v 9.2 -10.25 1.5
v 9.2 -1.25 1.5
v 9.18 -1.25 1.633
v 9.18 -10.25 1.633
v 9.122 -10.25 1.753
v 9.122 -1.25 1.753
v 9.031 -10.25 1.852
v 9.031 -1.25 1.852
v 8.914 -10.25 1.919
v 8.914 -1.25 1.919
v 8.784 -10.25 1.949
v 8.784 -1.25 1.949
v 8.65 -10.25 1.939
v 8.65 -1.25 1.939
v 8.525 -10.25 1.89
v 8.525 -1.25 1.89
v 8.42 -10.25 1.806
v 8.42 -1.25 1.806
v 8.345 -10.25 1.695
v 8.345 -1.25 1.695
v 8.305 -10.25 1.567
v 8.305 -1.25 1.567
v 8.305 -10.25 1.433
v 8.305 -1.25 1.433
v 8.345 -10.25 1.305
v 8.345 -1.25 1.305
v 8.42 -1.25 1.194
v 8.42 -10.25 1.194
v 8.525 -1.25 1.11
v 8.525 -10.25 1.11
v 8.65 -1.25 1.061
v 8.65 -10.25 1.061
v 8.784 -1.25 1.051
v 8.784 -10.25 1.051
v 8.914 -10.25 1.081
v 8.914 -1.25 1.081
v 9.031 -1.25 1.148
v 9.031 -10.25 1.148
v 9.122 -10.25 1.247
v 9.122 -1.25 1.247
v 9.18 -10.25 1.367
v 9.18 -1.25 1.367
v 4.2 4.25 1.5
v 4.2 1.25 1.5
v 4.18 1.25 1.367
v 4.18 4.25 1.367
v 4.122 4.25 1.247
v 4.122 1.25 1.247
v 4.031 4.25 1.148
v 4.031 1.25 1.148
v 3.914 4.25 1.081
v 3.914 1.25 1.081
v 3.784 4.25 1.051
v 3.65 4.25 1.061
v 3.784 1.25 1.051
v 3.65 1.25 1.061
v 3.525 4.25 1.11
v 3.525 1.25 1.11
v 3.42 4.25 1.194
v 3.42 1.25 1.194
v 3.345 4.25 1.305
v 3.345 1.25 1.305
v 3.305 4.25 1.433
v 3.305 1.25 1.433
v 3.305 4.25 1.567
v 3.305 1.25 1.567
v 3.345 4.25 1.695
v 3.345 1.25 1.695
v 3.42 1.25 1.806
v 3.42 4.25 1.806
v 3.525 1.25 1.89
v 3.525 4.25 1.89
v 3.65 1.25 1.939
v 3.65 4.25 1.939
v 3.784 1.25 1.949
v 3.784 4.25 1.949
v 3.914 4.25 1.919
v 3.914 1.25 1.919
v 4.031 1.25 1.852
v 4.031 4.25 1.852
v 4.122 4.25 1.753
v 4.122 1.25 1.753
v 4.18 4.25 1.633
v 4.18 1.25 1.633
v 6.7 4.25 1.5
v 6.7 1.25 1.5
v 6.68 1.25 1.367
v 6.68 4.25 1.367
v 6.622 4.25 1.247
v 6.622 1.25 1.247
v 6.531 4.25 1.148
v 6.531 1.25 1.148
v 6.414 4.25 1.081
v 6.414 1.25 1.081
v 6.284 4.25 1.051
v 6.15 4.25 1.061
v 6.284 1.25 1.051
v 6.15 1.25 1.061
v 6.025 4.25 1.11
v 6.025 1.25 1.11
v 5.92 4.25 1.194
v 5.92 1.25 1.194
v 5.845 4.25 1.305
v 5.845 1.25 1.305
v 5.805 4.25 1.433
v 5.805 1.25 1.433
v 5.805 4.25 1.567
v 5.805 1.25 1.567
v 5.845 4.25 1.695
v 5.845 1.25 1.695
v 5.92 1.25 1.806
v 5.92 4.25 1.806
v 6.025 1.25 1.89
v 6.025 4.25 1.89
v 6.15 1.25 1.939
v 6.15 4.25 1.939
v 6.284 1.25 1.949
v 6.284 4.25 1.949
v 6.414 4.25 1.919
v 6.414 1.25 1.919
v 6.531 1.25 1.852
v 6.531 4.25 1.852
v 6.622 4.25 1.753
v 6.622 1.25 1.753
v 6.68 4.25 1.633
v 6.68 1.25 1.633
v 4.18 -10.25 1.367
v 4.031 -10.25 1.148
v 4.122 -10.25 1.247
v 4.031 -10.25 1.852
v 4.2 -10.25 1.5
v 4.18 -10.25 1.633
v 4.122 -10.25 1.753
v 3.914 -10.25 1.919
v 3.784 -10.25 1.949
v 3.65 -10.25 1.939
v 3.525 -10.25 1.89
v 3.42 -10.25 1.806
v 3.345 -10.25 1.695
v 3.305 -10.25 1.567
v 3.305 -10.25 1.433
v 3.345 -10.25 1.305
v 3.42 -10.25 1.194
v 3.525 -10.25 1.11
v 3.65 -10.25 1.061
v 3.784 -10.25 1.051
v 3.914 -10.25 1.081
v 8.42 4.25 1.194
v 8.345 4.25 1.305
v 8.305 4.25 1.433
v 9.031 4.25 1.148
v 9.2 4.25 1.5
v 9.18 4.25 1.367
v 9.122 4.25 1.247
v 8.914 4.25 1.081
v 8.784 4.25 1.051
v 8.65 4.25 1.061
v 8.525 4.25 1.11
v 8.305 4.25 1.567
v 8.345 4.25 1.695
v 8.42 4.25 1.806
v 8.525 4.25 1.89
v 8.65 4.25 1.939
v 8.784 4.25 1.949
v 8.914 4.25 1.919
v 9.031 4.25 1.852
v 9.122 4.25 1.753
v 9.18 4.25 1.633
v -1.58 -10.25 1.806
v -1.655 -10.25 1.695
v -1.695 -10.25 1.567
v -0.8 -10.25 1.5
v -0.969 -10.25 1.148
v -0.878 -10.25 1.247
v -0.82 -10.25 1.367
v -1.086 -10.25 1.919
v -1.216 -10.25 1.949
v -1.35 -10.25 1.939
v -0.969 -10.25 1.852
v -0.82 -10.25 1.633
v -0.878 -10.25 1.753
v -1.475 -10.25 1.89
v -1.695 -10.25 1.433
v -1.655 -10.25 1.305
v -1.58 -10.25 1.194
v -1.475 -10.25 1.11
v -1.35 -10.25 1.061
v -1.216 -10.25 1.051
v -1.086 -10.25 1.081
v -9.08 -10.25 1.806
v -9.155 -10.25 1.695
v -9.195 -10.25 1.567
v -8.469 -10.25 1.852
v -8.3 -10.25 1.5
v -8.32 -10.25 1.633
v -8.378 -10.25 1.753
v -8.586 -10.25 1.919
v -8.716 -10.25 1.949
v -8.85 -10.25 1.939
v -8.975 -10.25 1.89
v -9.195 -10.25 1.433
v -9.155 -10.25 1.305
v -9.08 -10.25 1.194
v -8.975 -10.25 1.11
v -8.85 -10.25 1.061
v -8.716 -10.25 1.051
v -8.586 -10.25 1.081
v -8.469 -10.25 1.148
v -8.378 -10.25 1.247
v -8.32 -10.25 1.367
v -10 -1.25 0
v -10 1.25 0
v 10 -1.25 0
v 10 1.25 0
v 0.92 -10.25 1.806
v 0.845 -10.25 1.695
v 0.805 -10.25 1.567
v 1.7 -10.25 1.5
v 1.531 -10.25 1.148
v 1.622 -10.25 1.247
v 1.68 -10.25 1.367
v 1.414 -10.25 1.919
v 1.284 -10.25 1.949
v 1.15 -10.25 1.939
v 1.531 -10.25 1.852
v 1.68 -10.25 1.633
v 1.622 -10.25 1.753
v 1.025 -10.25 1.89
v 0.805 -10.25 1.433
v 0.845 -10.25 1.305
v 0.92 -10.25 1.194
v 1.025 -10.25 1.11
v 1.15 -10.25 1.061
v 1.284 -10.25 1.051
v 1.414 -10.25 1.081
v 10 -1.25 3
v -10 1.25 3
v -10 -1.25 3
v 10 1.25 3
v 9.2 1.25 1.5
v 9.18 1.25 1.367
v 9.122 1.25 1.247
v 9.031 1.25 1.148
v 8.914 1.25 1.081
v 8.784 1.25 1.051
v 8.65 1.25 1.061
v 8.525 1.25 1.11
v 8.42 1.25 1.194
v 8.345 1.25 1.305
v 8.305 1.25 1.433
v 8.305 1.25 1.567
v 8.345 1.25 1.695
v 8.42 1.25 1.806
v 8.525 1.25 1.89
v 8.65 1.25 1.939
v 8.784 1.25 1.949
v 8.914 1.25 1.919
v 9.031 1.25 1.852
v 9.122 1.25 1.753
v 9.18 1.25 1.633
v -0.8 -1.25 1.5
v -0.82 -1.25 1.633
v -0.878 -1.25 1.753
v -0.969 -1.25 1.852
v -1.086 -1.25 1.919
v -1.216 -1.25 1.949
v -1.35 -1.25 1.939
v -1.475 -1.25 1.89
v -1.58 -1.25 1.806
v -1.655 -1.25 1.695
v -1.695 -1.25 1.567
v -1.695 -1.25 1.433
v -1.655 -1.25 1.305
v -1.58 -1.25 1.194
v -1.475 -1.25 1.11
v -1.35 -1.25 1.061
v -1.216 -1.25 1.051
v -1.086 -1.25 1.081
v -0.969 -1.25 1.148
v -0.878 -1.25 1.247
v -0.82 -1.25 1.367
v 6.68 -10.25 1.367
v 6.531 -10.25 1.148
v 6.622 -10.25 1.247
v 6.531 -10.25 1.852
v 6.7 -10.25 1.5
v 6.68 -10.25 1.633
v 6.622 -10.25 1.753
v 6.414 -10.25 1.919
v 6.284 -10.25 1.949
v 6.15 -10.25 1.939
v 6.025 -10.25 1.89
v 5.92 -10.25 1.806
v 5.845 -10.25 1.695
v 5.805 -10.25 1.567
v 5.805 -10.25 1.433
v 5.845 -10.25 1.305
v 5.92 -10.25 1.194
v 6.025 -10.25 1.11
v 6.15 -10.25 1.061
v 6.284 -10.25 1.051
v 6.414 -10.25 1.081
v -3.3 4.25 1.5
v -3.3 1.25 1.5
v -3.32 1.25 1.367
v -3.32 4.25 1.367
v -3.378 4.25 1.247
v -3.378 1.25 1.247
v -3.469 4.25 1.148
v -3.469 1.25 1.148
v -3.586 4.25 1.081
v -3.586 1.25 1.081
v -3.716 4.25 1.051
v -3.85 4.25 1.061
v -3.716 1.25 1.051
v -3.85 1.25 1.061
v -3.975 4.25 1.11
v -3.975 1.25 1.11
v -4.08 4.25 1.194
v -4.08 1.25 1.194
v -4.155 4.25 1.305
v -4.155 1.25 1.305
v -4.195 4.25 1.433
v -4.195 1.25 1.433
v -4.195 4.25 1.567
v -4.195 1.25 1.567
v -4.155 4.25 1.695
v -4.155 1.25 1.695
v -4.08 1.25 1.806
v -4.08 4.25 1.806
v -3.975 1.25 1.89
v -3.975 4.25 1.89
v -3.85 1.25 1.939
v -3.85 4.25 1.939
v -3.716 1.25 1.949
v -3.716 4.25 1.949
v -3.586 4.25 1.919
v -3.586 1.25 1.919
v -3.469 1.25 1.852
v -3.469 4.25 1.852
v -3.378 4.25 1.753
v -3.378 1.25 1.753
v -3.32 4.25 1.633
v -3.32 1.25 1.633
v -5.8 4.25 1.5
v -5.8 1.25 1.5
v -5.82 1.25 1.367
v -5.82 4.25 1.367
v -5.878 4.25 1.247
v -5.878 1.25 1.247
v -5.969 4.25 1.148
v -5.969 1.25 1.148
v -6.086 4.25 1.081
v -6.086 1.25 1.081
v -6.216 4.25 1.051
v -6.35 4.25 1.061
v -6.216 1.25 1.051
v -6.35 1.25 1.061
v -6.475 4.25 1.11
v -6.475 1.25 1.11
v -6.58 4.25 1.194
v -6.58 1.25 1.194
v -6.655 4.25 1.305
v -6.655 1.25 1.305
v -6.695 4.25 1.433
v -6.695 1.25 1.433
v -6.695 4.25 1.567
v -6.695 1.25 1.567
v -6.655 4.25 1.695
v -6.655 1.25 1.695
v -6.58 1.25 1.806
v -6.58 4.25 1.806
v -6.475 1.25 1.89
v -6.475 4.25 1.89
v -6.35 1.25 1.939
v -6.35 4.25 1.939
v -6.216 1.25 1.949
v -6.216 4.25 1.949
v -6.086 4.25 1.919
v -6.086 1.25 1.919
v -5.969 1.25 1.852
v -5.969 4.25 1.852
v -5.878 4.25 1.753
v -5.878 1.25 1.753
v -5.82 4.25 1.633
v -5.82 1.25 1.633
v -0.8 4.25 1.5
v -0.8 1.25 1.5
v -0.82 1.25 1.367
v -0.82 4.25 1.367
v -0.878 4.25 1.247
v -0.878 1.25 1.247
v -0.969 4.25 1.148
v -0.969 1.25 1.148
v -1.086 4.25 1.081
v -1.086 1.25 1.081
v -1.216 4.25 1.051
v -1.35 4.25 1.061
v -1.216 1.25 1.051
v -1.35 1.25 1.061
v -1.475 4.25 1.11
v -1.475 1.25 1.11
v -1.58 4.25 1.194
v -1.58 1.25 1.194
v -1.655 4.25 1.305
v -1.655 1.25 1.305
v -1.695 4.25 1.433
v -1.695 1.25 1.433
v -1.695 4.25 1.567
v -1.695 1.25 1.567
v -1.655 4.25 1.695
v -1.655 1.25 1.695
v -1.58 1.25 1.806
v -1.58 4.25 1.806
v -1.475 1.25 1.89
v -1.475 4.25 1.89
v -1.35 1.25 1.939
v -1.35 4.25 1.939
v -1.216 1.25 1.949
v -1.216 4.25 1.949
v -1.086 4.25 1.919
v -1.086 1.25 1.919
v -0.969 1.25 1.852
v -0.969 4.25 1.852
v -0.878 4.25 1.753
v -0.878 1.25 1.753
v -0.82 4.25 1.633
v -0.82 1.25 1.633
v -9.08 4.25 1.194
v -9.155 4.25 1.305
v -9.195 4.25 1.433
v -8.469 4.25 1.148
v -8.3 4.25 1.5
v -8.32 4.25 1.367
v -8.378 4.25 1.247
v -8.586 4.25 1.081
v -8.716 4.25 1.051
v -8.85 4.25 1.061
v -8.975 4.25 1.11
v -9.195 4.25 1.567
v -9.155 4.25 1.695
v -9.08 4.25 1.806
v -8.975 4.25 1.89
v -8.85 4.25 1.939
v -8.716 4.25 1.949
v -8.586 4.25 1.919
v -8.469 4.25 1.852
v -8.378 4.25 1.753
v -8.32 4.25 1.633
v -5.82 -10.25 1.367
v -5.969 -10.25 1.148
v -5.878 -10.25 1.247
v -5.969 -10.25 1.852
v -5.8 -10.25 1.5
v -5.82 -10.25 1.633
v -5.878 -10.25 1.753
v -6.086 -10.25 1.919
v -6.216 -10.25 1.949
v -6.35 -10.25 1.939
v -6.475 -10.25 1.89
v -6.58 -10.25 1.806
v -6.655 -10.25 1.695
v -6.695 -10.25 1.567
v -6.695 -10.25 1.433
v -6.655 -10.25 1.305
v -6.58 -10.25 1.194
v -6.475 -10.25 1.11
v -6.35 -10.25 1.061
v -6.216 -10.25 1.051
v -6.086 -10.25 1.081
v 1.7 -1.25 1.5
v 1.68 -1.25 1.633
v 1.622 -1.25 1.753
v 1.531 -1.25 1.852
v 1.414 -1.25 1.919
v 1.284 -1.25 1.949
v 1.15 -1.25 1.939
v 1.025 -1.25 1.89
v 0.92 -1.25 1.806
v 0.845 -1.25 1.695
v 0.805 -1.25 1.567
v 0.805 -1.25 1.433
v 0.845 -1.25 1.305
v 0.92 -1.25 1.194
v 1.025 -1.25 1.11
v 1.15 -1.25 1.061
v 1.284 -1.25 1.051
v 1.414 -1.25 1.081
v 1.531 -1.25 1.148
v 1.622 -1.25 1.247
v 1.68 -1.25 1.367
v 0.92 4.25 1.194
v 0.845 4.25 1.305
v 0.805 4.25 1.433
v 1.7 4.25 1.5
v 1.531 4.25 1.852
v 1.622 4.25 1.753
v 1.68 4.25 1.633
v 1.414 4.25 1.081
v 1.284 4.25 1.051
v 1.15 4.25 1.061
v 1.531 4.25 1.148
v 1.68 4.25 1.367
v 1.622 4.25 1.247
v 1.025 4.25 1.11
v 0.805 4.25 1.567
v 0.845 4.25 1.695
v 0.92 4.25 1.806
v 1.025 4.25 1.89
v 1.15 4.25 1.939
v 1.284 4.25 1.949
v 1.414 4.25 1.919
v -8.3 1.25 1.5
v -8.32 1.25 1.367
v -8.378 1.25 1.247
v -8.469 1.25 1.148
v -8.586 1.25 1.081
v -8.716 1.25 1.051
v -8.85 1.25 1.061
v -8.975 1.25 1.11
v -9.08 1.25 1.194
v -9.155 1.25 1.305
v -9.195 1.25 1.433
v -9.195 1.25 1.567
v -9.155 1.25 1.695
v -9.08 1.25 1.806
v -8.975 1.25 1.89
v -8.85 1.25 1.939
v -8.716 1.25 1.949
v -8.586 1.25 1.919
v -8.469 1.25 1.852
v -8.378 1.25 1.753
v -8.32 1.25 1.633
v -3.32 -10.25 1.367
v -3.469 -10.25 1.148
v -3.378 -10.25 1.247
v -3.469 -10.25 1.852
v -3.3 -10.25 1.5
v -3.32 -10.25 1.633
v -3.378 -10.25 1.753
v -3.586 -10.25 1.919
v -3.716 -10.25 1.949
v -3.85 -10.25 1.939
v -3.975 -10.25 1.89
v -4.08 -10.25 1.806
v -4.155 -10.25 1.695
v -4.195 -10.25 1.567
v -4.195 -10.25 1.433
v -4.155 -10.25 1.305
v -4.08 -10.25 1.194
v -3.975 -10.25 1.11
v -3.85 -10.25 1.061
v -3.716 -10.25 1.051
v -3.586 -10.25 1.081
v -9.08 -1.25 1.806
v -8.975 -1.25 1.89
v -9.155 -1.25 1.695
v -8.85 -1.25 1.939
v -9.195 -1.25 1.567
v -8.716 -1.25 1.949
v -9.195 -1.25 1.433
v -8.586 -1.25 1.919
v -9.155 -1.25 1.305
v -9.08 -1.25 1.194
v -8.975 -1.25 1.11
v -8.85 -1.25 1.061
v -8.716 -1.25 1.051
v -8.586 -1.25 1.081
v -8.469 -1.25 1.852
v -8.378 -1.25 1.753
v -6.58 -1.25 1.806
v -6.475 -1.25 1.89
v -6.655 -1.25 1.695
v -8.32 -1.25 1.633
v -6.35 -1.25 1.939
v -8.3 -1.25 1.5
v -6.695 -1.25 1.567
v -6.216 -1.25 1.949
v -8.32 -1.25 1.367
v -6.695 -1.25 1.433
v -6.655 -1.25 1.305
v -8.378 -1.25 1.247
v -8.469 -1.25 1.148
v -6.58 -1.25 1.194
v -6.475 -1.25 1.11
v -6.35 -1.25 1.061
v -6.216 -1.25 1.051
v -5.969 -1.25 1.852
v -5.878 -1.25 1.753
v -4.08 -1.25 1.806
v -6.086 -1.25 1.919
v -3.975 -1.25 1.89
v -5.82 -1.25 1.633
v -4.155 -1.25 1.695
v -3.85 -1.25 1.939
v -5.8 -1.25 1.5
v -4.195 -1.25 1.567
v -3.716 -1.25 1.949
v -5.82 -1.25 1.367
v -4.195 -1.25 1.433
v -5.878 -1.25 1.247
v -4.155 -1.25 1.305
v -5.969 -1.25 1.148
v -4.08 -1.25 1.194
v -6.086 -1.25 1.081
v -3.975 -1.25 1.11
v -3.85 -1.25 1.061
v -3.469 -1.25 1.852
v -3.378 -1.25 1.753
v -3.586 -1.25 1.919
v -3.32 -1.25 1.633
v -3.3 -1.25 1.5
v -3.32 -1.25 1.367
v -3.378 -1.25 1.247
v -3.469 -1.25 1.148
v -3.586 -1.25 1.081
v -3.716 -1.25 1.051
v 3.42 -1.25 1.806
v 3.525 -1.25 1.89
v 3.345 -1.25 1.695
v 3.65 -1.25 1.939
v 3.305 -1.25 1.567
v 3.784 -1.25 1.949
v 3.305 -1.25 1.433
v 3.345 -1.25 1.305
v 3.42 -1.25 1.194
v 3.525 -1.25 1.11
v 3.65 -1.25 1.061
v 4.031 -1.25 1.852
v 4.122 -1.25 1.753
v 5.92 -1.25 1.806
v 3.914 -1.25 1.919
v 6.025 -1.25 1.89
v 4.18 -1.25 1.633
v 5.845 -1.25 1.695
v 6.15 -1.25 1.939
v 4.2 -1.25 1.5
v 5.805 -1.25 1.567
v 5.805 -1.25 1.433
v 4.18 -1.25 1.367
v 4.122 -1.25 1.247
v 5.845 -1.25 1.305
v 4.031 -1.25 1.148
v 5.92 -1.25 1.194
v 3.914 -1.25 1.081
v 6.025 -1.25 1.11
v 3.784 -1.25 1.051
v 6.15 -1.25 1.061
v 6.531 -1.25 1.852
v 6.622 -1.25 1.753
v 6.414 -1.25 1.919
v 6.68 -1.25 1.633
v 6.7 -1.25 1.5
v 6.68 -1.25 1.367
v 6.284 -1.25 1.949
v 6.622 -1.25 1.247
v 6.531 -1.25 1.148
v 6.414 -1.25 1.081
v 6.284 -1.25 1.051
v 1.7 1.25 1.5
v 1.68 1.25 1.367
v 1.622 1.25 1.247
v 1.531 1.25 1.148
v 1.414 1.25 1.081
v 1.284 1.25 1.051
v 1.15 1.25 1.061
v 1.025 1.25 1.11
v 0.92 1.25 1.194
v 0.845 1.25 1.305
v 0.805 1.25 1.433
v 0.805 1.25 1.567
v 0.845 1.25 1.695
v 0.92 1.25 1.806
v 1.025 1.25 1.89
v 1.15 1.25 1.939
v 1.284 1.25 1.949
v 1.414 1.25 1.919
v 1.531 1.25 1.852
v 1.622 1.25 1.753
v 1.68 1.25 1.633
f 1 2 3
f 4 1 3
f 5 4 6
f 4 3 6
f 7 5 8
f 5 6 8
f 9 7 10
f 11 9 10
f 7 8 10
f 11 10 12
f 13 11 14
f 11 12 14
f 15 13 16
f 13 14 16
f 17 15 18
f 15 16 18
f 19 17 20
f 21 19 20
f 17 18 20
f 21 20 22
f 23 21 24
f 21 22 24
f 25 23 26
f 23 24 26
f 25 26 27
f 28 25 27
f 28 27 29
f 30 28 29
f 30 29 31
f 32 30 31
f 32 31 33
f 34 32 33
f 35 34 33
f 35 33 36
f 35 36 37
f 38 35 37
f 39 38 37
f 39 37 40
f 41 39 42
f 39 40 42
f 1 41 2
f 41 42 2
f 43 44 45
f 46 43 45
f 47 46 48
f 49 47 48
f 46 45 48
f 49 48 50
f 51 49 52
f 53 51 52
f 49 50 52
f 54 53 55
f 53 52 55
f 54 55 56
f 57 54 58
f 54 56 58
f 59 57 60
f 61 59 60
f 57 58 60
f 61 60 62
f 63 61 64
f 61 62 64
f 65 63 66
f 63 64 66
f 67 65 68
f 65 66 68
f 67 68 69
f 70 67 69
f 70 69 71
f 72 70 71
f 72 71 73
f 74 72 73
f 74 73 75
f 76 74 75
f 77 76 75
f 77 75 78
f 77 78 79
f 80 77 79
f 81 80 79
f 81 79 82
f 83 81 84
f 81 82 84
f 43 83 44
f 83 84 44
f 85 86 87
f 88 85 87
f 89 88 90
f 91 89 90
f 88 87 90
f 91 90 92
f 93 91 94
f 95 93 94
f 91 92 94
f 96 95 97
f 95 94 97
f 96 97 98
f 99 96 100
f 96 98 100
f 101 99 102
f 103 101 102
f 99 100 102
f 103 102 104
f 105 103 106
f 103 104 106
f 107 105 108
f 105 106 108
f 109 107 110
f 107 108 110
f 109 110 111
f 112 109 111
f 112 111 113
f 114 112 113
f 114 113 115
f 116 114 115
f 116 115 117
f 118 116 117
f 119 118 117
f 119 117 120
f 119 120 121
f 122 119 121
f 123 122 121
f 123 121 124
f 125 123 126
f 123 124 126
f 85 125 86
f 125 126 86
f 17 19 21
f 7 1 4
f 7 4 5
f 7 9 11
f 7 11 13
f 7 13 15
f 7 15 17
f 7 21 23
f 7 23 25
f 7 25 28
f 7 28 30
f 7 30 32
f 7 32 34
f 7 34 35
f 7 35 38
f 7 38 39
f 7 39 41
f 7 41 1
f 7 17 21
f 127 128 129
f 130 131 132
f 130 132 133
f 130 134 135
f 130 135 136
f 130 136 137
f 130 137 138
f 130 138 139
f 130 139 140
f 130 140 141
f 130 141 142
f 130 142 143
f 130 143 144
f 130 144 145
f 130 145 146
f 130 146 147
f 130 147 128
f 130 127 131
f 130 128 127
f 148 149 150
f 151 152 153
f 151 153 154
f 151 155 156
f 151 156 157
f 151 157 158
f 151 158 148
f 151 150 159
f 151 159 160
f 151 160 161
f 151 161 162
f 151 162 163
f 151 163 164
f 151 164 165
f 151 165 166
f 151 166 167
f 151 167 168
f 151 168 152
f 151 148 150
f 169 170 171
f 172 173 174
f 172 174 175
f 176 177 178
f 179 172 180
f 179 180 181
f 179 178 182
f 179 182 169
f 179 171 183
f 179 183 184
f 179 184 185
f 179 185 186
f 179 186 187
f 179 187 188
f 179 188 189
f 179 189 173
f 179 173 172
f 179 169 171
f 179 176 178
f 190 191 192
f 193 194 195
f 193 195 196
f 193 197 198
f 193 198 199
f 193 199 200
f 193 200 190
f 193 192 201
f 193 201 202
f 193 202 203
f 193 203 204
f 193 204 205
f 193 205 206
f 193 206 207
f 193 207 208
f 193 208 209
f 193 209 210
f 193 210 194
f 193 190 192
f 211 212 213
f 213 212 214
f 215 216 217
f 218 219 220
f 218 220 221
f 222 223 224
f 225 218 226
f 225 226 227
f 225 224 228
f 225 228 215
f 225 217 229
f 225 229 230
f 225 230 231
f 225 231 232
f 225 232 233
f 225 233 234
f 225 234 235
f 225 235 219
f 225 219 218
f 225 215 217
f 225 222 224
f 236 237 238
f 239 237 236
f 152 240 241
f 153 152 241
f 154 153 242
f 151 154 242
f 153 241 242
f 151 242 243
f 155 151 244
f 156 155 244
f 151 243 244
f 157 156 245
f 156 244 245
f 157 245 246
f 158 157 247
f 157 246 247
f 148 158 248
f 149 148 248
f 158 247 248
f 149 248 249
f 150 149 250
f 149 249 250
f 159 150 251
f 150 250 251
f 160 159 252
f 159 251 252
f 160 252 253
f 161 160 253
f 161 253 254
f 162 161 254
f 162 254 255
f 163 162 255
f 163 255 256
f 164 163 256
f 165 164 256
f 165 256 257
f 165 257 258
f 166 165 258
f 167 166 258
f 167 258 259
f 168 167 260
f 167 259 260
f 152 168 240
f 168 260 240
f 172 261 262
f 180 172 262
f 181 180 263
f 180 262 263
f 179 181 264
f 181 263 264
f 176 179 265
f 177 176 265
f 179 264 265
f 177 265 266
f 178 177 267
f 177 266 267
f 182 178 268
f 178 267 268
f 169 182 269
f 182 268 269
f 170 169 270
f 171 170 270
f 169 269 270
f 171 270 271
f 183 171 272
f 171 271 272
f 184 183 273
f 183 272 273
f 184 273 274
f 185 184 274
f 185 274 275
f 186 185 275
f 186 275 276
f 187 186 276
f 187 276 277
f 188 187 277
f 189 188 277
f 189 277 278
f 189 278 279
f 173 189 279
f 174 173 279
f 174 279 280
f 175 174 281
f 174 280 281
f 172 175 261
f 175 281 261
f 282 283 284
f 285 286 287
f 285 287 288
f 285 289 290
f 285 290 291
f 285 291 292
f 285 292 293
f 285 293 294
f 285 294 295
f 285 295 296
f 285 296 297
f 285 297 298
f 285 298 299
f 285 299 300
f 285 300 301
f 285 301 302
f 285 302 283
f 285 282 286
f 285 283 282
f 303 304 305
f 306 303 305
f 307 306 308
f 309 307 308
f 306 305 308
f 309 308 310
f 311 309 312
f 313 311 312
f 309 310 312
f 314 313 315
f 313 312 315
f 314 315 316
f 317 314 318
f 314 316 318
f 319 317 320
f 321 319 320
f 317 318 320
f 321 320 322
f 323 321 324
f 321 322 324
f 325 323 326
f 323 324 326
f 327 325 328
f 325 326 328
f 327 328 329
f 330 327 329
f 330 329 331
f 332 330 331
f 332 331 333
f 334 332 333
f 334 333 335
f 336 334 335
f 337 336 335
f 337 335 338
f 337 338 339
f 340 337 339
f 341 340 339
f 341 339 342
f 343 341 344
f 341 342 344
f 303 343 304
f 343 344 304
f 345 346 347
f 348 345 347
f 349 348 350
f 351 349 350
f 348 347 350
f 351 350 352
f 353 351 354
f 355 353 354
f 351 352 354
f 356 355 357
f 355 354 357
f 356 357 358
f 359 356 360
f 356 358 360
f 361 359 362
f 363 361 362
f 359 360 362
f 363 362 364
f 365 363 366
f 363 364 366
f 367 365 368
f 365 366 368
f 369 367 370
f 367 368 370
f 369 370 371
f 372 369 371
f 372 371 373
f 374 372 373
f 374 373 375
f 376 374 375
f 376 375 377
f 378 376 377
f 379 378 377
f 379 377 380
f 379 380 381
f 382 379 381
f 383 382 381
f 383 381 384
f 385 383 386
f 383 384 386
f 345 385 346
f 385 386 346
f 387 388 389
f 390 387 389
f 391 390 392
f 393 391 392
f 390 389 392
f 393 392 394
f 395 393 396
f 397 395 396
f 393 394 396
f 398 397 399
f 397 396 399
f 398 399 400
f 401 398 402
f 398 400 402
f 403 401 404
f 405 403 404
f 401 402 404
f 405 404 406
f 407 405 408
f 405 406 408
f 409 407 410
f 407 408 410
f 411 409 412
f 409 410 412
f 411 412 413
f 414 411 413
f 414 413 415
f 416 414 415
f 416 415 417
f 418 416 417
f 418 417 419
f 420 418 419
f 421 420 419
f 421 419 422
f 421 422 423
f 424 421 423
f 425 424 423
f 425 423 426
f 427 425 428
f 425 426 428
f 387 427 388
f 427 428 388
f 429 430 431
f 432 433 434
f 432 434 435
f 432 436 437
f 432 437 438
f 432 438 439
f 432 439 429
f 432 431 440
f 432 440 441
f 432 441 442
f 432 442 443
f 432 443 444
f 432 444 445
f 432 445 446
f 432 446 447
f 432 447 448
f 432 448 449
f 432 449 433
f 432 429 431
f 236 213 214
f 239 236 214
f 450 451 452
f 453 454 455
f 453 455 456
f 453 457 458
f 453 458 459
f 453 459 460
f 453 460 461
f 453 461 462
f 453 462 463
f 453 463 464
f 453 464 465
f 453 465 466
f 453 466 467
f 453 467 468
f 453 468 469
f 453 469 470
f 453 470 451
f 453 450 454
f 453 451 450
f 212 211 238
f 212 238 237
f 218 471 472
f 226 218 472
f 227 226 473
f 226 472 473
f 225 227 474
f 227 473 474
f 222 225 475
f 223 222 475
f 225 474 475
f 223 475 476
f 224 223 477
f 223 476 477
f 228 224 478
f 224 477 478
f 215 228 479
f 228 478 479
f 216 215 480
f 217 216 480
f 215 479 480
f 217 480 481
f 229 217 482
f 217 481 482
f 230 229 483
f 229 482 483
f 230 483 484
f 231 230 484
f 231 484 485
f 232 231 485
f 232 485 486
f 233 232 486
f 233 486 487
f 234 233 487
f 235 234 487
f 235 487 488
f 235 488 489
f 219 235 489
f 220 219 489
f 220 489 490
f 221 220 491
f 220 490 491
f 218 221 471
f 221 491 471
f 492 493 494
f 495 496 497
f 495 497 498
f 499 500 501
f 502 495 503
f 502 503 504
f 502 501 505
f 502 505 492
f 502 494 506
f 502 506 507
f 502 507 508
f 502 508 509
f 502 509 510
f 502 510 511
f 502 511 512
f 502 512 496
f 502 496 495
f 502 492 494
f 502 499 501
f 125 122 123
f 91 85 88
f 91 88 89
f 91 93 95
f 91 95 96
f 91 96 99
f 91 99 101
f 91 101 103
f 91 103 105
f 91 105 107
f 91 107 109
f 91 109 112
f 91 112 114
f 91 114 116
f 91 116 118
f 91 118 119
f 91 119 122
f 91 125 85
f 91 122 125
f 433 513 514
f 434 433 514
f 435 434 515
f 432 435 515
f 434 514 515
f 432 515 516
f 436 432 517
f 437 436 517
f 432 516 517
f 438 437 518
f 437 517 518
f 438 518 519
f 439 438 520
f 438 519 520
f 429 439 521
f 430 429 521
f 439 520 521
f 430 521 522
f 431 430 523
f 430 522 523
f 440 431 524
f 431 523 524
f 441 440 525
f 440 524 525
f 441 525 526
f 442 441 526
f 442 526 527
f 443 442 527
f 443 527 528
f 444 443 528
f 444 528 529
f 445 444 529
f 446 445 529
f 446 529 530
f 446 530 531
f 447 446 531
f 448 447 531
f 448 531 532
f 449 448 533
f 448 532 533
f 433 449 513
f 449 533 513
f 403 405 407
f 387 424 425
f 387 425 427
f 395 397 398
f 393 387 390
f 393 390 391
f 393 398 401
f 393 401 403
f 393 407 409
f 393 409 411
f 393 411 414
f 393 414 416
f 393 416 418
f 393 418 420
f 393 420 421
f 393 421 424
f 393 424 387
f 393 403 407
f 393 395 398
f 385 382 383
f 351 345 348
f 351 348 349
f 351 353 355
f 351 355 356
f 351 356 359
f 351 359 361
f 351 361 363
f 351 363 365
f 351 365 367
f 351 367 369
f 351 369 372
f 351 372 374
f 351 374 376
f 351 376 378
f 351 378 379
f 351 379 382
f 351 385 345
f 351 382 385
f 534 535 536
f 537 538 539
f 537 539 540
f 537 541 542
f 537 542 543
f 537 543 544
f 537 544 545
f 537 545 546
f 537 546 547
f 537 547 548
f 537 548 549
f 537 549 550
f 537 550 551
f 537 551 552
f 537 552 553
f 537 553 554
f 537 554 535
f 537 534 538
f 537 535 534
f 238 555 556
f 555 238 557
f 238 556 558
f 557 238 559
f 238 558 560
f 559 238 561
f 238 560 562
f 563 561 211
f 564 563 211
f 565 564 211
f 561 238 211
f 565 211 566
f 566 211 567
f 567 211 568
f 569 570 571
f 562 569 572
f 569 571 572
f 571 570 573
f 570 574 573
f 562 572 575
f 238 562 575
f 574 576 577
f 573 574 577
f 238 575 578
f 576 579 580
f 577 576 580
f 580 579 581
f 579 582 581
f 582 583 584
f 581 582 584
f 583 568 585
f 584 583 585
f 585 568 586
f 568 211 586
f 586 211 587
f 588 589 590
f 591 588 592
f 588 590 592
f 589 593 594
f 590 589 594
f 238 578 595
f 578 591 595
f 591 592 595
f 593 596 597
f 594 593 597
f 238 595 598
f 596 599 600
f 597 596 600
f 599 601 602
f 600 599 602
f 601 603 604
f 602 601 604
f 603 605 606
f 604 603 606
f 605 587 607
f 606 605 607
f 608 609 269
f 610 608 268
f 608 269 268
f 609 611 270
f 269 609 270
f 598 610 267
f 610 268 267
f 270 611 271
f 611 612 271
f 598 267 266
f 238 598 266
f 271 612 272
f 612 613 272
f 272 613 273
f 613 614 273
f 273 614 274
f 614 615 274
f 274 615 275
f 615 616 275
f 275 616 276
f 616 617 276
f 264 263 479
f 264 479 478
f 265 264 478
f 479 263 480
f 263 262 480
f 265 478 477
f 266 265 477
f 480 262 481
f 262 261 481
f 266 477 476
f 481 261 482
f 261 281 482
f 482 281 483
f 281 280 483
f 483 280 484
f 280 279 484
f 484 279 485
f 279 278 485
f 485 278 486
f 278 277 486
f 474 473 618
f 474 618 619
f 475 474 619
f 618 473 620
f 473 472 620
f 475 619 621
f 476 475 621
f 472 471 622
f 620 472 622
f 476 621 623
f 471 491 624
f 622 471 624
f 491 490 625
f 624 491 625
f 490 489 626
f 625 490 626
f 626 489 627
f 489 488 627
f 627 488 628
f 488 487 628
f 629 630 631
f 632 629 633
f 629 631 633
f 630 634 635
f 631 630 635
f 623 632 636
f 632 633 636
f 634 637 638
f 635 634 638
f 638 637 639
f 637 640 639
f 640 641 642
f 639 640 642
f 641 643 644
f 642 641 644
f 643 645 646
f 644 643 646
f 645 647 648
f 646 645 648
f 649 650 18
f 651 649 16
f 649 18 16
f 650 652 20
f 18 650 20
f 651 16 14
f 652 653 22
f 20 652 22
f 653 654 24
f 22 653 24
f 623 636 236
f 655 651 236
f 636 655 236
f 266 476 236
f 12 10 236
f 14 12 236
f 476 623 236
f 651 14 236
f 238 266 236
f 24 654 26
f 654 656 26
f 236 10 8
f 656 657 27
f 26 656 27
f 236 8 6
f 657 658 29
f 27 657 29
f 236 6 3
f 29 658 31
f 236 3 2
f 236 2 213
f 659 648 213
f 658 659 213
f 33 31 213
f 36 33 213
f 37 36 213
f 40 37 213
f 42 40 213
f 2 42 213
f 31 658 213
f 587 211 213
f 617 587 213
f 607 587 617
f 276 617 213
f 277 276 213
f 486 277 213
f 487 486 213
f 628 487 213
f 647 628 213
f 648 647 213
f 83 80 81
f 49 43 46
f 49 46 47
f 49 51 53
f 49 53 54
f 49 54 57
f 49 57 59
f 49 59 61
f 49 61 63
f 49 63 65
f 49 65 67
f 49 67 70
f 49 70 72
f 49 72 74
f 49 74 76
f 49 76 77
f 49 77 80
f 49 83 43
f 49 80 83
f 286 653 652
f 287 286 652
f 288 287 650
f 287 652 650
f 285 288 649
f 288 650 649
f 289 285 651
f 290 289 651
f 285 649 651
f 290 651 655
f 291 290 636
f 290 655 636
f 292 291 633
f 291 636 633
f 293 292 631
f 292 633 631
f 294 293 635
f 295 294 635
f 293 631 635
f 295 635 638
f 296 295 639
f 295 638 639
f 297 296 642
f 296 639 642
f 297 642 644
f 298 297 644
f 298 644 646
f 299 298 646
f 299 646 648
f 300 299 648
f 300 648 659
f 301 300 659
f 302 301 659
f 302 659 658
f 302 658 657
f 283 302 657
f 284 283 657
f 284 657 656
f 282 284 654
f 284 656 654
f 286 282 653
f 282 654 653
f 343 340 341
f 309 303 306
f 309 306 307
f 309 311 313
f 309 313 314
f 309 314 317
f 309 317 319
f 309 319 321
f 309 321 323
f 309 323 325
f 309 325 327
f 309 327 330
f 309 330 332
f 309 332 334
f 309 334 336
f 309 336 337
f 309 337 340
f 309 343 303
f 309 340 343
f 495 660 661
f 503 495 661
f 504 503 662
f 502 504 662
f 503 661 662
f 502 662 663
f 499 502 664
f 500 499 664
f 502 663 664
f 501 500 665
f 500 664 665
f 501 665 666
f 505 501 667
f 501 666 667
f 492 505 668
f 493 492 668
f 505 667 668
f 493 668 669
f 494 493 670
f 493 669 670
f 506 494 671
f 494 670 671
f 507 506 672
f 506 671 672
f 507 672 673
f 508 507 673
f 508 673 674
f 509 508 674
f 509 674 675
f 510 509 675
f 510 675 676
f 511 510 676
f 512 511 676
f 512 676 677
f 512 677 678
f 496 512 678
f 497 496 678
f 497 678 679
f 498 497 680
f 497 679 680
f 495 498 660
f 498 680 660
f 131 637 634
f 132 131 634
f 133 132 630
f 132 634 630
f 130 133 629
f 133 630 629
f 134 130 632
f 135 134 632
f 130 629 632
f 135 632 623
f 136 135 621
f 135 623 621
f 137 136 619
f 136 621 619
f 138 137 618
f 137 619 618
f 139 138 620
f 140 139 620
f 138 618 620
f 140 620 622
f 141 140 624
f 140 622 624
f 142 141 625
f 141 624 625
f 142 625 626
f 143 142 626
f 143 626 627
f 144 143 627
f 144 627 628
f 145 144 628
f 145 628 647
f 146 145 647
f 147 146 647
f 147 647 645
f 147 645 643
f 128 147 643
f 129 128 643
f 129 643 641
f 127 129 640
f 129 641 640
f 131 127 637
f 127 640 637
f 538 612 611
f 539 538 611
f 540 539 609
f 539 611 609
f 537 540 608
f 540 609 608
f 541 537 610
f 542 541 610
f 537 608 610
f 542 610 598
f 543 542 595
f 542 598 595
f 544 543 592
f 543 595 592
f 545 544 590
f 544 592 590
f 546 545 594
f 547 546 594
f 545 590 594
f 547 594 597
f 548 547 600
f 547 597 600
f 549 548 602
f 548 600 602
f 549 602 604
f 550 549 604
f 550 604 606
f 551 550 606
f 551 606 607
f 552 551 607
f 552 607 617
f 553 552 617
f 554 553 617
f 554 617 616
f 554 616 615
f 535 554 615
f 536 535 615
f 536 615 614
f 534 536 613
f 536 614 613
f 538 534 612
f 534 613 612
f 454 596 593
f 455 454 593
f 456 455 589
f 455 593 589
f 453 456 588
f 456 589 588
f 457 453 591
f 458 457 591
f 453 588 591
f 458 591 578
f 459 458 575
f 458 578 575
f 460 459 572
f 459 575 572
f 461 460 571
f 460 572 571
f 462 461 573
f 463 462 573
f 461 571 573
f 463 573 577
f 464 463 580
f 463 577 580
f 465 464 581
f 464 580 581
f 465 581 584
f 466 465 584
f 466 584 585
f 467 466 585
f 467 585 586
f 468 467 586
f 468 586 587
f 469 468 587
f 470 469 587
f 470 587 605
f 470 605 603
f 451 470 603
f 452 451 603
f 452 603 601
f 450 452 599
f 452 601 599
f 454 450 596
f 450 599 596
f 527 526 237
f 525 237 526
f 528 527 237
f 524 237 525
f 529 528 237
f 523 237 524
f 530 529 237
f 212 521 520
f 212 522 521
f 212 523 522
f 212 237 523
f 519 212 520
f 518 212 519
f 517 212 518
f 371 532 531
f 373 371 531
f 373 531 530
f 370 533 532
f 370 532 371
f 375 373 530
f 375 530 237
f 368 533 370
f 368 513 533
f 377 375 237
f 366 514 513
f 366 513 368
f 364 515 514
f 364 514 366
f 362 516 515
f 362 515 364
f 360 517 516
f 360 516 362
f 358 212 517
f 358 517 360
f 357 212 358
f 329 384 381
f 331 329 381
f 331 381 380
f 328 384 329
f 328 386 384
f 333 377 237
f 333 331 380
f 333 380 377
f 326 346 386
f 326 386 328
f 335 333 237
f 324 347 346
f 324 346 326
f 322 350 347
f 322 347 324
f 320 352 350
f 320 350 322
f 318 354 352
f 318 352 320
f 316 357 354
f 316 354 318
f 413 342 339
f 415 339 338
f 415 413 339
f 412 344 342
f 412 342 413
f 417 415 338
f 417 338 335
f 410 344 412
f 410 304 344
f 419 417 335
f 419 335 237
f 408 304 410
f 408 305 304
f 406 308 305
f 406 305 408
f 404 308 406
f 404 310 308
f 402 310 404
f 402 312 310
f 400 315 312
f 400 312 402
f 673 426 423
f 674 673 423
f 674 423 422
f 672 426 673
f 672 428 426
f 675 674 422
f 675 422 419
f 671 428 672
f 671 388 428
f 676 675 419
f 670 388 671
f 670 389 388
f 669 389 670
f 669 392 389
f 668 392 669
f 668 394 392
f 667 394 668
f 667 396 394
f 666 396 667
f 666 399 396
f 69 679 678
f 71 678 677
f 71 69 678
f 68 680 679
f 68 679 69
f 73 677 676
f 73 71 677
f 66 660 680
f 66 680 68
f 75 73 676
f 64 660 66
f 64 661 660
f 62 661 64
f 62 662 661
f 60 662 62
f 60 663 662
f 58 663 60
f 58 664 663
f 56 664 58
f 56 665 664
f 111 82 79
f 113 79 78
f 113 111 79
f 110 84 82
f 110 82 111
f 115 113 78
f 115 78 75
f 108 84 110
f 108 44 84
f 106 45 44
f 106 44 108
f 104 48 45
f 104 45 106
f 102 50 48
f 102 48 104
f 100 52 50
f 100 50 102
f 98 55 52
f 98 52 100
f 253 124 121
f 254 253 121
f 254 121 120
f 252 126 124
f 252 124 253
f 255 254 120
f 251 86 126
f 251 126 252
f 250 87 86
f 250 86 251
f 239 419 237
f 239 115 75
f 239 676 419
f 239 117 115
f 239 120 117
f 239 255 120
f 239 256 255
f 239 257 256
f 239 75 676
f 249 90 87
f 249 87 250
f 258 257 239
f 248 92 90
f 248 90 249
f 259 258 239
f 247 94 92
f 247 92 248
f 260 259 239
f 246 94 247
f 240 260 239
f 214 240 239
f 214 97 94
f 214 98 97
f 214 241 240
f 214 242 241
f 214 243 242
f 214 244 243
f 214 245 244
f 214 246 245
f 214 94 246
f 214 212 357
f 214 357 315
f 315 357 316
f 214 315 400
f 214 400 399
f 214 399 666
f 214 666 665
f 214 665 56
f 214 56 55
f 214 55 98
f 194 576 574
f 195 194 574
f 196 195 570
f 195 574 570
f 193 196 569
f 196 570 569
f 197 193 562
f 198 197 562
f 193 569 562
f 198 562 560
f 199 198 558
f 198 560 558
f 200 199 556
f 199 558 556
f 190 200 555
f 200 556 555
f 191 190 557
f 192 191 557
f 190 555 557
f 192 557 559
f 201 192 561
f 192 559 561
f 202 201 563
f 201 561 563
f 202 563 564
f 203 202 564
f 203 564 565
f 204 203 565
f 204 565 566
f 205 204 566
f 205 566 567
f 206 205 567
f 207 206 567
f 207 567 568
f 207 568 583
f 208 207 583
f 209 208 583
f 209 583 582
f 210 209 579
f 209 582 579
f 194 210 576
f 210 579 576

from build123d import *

# Parameters (mm, degrees)
CROQUIS1_W              = 20
CROQUIS1_H              = 2.5
SALIENTE_EXTRUIR1_DEPTH = 3
CROQUIS2_R              = 0.45
SALIENTE_EXTRUIR2_DEPTH = 3
CROQUIS3_R              = 0.45
SALIENTE_EXTRUIR3_DEPTH = 9


with BuildPart() as part:
    # Croquis1 → Saliente-Extruir1 (new body)
    with BuildSketch(Plane.XY):
        Rectangle(CROQUIS1_W, CROQUIS1_H)
    extrude(amount=SALIENTE_EXTRUIR1_DEPTH)

    # Croquis2 → Saliente-Extruir2 (add)
    with BuildSketch(Plane(origin=(0, 1.25, 0), x_dir=(1, 0, 0), z_dir=(0, 1, 0))):
        with Locations((-8.75, -1.5)):
            Circle(CROQUIS2_R)
        with Locations((-6.25, -1.5)):
            Circle(CROQUIS2_R)
        with Locations((-3.75, -1.5)):
            Circle(CROQUIS2_R)
        with Locations((-1.25, -1.5)):
            Circle(CROQUIS2_R)
        with Locations((1.25, -1.5)):
            Circle(CROQUIS2_R)
        with Locations((3.75, -1.5)):
            Circle(CROQUIS2_R)
        with Locations((6.25, -1.5)):
            Circle(CROQUIS2_R)
        with Locations((8.75, -1.5)):
            Circle(CROQUIS2_R)
    extrude(amount=SALIENTE_EXTRUIR2_DEPTH)

    # Croquis3 → Saliente-Extruir3 (add)
    with BuildSketch(Plane.XZ.offset(1.25)):
        with Locations((-8.75, 1.5)):
            Circle(CROQUIS3_R)
        with Locations((-6.25, 1.5)):
            Circle(CROQUIS3_R)
        with Locations((-3.75, 1.5)):
            Circle(CROQUIS3_R)
        with Locations((-1.25, 1.5)):
            Circle(CROQUIS3_R)
        with Locations((1.25, 1.5)):
            Circle(CROQUIS3_R)
        with Locations((3.75, 1.5)):
            Circle(CROQUIS3_R)
        with Locations((6.25, 1.5)):
            Circle(CROQUIS3_R)
        with Locations((8.75, 1.5)):
            Circle(CROQUIS3_R)
    extrude(amount=SALIENTE_EXTRUIR3_DEPTH)


solid = part.part
